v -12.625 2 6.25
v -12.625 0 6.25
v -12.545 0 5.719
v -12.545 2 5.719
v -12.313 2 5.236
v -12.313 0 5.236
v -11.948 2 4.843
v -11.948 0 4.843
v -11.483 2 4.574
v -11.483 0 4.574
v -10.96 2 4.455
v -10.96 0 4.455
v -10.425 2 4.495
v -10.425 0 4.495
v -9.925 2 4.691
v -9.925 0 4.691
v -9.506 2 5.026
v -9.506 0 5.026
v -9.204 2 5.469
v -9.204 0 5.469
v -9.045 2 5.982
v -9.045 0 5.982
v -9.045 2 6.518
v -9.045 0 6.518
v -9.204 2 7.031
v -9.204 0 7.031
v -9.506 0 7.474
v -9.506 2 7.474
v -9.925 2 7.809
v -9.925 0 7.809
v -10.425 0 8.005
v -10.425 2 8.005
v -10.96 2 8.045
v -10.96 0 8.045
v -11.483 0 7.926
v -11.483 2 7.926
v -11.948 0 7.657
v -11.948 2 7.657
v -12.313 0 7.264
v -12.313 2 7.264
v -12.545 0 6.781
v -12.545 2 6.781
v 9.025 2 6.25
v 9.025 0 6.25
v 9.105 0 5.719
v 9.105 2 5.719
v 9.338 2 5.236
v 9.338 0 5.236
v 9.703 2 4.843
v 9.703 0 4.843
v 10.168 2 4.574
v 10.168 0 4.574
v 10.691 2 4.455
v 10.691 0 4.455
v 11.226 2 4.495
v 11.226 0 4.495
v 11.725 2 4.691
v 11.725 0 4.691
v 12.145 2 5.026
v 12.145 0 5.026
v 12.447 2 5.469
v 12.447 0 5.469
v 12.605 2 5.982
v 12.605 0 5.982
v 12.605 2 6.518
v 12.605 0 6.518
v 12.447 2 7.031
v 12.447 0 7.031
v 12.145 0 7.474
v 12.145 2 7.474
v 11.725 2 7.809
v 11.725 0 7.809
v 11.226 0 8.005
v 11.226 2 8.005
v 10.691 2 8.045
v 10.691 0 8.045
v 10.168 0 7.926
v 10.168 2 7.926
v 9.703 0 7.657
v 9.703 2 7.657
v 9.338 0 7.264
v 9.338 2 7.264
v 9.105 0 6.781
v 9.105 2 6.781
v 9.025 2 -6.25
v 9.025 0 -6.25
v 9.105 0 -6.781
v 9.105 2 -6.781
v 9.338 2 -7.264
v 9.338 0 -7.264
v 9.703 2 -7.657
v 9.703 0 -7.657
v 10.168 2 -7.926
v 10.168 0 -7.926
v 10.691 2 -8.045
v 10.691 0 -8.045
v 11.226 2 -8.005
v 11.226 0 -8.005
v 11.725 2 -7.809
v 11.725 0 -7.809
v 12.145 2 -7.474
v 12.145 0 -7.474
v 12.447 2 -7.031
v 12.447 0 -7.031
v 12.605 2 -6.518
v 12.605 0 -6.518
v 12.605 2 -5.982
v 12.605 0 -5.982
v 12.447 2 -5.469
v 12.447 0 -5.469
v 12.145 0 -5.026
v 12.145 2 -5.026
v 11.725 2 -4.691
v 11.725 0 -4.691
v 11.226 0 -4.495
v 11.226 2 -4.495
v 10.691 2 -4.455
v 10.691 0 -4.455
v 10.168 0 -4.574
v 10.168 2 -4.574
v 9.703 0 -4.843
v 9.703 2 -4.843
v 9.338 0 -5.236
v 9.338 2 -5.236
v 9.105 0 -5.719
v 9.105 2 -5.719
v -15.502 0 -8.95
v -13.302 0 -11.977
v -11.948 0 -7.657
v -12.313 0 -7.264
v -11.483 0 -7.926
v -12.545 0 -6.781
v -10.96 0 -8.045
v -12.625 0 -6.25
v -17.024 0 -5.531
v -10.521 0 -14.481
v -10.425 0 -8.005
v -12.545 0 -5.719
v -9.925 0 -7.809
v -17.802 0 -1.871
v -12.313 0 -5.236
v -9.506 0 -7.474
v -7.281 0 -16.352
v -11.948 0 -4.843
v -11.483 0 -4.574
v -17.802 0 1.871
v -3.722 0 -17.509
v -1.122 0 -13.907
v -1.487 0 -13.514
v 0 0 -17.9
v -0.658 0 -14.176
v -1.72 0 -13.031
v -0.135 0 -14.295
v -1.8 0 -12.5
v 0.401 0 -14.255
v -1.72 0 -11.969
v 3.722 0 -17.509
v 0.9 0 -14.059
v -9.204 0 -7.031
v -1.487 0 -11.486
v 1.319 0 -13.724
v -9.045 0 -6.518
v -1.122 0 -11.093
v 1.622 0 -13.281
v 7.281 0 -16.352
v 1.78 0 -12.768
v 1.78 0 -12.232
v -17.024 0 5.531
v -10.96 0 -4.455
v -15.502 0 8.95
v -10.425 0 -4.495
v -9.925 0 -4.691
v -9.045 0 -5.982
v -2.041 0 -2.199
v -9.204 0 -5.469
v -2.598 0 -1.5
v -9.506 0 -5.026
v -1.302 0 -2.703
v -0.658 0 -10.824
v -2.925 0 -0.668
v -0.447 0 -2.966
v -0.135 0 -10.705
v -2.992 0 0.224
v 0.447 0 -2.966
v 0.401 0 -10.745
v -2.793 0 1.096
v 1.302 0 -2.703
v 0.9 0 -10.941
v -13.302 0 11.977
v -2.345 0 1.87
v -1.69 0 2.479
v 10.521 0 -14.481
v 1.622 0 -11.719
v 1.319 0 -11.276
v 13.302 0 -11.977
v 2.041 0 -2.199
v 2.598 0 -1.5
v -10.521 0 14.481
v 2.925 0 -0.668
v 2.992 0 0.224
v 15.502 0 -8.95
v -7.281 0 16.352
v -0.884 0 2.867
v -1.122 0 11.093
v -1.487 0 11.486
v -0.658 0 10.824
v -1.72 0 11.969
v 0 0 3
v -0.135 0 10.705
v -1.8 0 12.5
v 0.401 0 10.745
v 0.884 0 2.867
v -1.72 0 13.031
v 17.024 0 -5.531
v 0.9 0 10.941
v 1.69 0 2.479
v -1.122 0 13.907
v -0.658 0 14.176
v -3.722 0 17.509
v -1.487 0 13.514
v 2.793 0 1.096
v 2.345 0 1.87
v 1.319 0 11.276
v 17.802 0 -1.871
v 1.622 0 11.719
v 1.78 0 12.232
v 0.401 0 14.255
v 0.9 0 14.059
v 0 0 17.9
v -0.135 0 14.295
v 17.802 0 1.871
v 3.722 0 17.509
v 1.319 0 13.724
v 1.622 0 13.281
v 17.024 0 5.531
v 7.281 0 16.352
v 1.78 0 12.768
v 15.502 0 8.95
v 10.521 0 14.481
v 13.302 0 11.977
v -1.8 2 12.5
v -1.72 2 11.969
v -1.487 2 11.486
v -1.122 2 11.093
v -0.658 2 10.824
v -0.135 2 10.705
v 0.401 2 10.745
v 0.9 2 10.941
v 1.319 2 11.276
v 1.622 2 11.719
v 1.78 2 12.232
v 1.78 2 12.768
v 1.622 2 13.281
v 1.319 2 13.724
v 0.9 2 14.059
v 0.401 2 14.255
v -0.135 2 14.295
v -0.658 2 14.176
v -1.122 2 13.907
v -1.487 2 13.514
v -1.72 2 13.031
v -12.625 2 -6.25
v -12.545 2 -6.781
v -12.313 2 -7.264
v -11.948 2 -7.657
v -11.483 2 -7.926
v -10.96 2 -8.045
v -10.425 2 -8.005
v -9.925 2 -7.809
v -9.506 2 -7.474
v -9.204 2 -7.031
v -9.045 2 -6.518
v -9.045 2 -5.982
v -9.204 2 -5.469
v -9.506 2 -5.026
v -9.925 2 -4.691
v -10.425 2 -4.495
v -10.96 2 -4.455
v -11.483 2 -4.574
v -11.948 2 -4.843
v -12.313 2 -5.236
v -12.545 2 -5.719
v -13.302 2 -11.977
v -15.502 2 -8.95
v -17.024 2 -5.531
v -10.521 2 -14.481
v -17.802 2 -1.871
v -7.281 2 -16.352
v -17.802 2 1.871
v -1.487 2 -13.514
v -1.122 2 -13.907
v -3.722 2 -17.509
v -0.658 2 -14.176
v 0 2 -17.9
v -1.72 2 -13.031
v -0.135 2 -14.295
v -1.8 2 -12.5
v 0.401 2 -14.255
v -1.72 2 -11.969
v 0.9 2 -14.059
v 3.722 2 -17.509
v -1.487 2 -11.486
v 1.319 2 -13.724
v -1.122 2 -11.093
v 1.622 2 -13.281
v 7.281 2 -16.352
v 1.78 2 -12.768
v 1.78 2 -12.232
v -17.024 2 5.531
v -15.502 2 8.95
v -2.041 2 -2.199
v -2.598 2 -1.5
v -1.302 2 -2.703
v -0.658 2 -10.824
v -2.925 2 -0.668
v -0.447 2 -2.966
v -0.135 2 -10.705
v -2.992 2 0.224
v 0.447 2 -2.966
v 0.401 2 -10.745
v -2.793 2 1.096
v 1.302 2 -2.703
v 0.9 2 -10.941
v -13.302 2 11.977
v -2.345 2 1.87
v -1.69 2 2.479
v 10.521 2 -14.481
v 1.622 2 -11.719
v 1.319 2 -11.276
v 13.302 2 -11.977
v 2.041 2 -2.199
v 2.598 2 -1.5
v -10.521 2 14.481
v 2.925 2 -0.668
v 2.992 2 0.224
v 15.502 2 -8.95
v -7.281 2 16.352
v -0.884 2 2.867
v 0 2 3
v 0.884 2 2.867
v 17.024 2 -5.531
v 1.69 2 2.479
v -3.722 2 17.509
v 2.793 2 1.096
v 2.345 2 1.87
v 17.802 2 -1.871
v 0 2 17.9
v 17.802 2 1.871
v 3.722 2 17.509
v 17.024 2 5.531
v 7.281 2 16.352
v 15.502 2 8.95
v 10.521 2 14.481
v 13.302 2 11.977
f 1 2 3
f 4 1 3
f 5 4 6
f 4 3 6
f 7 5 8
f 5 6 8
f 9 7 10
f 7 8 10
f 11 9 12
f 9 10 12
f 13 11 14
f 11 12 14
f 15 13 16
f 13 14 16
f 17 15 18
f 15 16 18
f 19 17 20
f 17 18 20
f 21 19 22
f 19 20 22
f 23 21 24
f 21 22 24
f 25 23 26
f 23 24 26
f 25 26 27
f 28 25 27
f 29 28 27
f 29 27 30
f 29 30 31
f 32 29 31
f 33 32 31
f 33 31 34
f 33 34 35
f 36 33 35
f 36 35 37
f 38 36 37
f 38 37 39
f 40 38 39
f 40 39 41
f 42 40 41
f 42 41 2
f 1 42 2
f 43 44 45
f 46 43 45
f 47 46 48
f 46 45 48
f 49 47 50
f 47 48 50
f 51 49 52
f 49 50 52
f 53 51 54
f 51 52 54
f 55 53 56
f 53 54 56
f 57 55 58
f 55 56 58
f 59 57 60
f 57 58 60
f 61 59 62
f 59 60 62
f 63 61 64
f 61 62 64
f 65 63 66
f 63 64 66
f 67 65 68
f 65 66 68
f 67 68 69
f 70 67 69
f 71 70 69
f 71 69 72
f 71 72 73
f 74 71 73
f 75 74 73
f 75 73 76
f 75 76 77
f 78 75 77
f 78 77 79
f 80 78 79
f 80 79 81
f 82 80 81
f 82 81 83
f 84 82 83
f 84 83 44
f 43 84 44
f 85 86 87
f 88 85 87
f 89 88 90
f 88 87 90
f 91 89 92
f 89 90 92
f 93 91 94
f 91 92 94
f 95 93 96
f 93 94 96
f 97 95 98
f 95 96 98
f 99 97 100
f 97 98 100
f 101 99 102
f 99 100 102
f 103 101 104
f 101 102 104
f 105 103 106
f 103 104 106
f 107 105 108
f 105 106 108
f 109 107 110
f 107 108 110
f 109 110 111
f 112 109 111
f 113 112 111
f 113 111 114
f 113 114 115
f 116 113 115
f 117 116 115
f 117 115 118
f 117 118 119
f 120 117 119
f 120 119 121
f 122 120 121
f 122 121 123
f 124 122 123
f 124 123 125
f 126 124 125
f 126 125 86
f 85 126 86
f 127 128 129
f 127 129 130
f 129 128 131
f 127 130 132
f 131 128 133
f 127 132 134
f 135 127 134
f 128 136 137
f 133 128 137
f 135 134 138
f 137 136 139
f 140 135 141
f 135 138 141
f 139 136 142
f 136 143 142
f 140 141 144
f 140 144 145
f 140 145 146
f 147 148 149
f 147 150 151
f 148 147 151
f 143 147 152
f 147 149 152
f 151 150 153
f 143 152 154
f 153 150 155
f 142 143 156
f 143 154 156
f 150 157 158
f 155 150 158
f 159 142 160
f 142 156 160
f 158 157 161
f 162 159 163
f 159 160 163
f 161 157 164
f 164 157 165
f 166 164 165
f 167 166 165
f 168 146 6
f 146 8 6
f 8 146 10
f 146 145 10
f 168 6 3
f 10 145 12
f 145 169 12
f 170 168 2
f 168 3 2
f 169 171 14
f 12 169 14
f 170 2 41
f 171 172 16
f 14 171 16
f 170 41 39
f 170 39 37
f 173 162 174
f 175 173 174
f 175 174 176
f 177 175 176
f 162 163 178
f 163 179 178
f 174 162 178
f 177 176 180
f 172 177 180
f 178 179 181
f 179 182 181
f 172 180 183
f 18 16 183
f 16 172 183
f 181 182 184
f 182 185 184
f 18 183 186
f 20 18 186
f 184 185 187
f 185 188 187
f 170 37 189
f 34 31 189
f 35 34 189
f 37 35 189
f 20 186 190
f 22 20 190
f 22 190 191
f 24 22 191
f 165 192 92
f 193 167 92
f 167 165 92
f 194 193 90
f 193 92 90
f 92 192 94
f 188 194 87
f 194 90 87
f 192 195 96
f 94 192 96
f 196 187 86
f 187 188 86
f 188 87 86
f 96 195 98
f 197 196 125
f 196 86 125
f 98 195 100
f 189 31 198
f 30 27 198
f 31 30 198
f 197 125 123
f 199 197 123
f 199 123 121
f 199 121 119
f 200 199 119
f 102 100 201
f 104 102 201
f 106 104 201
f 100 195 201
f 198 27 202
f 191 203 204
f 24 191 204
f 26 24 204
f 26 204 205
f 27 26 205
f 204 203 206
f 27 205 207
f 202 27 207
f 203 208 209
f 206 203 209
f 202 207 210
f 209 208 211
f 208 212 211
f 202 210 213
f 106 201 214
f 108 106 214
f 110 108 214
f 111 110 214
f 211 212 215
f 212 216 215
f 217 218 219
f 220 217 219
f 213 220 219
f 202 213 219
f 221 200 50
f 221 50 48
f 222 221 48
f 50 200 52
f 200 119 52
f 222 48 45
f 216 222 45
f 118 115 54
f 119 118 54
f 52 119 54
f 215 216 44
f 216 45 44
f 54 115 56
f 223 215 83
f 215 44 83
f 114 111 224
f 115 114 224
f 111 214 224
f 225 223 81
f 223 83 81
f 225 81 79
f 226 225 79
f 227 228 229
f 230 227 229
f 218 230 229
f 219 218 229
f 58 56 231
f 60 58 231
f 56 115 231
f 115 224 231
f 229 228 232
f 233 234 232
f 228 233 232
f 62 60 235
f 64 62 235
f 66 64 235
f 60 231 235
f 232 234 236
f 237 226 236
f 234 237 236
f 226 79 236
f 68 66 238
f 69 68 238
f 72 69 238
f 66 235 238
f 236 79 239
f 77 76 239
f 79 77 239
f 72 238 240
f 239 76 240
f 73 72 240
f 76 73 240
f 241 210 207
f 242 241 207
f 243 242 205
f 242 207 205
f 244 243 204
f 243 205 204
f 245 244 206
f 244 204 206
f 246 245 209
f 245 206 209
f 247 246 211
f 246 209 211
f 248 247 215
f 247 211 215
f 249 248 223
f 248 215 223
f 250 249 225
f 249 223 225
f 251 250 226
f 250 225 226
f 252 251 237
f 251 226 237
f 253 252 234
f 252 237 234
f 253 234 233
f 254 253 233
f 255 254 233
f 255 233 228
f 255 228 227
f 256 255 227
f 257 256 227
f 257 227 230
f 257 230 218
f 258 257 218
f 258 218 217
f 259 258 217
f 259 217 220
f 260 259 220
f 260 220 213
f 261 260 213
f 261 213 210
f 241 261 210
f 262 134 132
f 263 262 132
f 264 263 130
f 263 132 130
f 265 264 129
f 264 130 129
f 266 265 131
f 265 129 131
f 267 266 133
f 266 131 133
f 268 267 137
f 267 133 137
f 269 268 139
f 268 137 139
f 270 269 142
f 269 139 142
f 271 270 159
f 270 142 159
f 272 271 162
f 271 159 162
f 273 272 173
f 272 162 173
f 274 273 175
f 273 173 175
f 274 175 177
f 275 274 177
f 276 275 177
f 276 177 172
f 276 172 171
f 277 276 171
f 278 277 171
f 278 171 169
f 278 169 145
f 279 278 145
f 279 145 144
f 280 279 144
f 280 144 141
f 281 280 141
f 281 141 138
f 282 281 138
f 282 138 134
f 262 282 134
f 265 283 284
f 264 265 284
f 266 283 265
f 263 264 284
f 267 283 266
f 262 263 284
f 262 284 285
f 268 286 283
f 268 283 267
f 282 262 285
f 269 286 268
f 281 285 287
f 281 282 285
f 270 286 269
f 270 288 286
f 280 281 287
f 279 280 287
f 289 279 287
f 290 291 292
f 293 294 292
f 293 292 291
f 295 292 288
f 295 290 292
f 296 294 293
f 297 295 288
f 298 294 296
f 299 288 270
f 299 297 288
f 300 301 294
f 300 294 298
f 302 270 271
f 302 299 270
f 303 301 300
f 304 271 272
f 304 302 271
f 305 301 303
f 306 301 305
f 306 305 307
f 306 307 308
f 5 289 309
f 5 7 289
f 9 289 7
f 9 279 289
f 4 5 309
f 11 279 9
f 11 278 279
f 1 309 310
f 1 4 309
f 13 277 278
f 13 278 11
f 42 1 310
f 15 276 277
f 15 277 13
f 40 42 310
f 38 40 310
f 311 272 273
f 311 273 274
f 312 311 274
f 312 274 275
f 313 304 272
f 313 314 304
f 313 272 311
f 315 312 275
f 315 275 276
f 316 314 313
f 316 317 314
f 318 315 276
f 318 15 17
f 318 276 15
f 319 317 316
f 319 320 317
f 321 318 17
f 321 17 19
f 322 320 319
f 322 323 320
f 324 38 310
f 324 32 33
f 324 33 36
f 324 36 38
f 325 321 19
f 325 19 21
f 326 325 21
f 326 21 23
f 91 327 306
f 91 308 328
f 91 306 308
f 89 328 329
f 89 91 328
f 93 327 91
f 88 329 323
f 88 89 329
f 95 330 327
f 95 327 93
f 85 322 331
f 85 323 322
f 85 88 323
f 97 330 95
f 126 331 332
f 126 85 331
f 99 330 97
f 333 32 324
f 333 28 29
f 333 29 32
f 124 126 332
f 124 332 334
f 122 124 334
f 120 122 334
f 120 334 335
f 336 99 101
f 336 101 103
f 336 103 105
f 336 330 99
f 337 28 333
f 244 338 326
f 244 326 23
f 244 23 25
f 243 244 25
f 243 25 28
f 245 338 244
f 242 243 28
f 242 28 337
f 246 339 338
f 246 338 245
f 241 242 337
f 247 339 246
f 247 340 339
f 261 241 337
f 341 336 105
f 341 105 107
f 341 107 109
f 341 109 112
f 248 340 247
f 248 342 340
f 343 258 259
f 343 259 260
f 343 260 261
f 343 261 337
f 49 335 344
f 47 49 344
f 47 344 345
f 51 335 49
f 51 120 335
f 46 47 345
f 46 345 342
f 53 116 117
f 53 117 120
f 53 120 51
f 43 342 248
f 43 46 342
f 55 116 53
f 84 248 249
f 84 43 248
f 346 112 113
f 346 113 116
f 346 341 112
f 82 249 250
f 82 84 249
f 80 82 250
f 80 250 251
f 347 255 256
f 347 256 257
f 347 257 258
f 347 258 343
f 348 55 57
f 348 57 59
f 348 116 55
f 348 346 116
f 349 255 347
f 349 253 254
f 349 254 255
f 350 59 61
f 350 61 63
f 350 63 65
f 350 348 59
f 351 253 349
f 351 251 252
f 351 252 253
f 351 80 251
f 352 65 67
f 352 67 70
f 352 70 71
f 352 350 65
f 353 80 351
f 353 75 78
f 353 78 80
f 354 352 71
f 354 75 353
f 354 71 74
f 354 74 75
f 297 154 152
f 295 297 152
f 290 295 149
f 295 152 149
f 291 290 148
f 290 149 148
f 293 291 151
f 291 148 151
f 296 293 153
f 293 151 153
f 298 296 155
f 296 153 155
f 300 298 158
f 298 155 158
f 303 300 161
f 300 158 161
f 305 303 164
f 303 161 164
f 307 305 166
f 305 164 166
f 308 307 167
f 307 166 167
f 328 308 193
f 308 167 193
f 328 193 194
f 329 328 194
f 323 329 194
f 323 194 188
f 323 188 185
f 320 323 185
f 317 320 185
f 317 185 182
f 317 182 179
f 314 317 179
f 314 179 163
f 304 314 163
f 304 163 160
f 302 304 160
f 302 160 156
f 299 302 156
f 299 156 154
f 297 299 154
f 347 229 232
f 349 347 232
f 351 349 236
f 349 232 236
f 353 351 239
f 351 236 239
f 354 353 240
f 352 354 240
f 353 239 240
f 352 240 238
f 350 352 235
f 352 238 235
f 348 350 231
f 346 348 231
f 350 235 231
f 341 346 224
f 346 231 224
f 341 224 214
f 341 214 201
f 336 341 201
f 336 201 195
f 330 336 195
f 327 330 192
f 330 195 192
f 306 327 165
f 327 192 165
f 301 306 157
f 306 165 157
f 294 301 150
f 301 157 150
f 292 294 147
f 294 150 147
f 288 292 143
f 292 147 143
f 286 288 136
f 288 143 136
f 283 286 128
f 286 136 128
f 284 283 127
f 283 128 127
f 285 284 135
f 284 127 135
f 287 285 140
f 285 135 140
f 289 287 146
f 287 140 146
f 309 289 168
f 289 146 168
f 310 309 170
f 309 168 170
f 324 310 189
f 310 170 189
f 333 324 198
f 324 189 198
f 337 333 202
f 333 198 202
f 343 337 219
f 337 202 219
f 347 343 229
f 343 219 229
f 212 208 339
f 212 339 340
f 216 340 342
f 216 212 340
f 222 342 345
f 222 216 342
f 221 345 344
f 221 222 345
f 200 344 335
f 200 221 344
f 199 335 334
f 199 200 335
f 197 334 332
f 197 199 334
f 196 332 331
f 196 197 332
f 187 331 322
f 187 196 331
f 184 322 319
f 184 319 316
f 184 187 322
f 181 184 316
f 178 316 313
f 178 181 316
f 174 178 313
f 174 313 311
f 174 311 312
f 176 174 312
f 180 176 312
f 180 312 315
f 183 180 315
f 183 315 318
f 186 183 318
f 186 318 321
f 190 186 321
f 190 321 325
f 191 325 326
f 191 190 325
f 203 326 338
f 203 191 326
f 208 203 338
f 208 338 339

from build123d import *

# Parameters (mm, degrees)
SKETCH1_R            = 17.9
SKETCH1_R_2          = 3
BOSS_EXTRUDE1_DEPTH  = 2
M3_CLEARANCE_HOLE1_D = 3.6


with BuildPart() as part:
    # Sketch1 → Boss-Extrude1 (new body)
    with BuildSketch(Plane(origin=(0, 0, 0), x_dir=(1, 0, 0), z_dir=(0, 1, 0))):
        with Locations(Location((0, 0, 0), (0, 0, 270))):
            Circle(SKETCH1_R)
        with Locations(Location((0, 0, 0), (0, 0, 270))):
            Circle(SKETCH1_R_2, mode=Mode.SUBTRACT)
    extrude(amount=BOSS_EXTRUDE1_DEPTH)

    # M3 Clearance Hole1 (through all)
    with Locations(Plane(origin=(0, 2, 0), x_dir=(1, 0, 0), z_dir=(0, 1, 0))):
        with Locations((0, 12.5), (-10.825317547, 6.25), (-10.825317547, -6.25), (0, -12.5), (10.825317547, -6.25), (10.825317547, 6.25)):
            Hole(M3_CLEARANCE_HOLE1_D / 2)


solid = part.part
